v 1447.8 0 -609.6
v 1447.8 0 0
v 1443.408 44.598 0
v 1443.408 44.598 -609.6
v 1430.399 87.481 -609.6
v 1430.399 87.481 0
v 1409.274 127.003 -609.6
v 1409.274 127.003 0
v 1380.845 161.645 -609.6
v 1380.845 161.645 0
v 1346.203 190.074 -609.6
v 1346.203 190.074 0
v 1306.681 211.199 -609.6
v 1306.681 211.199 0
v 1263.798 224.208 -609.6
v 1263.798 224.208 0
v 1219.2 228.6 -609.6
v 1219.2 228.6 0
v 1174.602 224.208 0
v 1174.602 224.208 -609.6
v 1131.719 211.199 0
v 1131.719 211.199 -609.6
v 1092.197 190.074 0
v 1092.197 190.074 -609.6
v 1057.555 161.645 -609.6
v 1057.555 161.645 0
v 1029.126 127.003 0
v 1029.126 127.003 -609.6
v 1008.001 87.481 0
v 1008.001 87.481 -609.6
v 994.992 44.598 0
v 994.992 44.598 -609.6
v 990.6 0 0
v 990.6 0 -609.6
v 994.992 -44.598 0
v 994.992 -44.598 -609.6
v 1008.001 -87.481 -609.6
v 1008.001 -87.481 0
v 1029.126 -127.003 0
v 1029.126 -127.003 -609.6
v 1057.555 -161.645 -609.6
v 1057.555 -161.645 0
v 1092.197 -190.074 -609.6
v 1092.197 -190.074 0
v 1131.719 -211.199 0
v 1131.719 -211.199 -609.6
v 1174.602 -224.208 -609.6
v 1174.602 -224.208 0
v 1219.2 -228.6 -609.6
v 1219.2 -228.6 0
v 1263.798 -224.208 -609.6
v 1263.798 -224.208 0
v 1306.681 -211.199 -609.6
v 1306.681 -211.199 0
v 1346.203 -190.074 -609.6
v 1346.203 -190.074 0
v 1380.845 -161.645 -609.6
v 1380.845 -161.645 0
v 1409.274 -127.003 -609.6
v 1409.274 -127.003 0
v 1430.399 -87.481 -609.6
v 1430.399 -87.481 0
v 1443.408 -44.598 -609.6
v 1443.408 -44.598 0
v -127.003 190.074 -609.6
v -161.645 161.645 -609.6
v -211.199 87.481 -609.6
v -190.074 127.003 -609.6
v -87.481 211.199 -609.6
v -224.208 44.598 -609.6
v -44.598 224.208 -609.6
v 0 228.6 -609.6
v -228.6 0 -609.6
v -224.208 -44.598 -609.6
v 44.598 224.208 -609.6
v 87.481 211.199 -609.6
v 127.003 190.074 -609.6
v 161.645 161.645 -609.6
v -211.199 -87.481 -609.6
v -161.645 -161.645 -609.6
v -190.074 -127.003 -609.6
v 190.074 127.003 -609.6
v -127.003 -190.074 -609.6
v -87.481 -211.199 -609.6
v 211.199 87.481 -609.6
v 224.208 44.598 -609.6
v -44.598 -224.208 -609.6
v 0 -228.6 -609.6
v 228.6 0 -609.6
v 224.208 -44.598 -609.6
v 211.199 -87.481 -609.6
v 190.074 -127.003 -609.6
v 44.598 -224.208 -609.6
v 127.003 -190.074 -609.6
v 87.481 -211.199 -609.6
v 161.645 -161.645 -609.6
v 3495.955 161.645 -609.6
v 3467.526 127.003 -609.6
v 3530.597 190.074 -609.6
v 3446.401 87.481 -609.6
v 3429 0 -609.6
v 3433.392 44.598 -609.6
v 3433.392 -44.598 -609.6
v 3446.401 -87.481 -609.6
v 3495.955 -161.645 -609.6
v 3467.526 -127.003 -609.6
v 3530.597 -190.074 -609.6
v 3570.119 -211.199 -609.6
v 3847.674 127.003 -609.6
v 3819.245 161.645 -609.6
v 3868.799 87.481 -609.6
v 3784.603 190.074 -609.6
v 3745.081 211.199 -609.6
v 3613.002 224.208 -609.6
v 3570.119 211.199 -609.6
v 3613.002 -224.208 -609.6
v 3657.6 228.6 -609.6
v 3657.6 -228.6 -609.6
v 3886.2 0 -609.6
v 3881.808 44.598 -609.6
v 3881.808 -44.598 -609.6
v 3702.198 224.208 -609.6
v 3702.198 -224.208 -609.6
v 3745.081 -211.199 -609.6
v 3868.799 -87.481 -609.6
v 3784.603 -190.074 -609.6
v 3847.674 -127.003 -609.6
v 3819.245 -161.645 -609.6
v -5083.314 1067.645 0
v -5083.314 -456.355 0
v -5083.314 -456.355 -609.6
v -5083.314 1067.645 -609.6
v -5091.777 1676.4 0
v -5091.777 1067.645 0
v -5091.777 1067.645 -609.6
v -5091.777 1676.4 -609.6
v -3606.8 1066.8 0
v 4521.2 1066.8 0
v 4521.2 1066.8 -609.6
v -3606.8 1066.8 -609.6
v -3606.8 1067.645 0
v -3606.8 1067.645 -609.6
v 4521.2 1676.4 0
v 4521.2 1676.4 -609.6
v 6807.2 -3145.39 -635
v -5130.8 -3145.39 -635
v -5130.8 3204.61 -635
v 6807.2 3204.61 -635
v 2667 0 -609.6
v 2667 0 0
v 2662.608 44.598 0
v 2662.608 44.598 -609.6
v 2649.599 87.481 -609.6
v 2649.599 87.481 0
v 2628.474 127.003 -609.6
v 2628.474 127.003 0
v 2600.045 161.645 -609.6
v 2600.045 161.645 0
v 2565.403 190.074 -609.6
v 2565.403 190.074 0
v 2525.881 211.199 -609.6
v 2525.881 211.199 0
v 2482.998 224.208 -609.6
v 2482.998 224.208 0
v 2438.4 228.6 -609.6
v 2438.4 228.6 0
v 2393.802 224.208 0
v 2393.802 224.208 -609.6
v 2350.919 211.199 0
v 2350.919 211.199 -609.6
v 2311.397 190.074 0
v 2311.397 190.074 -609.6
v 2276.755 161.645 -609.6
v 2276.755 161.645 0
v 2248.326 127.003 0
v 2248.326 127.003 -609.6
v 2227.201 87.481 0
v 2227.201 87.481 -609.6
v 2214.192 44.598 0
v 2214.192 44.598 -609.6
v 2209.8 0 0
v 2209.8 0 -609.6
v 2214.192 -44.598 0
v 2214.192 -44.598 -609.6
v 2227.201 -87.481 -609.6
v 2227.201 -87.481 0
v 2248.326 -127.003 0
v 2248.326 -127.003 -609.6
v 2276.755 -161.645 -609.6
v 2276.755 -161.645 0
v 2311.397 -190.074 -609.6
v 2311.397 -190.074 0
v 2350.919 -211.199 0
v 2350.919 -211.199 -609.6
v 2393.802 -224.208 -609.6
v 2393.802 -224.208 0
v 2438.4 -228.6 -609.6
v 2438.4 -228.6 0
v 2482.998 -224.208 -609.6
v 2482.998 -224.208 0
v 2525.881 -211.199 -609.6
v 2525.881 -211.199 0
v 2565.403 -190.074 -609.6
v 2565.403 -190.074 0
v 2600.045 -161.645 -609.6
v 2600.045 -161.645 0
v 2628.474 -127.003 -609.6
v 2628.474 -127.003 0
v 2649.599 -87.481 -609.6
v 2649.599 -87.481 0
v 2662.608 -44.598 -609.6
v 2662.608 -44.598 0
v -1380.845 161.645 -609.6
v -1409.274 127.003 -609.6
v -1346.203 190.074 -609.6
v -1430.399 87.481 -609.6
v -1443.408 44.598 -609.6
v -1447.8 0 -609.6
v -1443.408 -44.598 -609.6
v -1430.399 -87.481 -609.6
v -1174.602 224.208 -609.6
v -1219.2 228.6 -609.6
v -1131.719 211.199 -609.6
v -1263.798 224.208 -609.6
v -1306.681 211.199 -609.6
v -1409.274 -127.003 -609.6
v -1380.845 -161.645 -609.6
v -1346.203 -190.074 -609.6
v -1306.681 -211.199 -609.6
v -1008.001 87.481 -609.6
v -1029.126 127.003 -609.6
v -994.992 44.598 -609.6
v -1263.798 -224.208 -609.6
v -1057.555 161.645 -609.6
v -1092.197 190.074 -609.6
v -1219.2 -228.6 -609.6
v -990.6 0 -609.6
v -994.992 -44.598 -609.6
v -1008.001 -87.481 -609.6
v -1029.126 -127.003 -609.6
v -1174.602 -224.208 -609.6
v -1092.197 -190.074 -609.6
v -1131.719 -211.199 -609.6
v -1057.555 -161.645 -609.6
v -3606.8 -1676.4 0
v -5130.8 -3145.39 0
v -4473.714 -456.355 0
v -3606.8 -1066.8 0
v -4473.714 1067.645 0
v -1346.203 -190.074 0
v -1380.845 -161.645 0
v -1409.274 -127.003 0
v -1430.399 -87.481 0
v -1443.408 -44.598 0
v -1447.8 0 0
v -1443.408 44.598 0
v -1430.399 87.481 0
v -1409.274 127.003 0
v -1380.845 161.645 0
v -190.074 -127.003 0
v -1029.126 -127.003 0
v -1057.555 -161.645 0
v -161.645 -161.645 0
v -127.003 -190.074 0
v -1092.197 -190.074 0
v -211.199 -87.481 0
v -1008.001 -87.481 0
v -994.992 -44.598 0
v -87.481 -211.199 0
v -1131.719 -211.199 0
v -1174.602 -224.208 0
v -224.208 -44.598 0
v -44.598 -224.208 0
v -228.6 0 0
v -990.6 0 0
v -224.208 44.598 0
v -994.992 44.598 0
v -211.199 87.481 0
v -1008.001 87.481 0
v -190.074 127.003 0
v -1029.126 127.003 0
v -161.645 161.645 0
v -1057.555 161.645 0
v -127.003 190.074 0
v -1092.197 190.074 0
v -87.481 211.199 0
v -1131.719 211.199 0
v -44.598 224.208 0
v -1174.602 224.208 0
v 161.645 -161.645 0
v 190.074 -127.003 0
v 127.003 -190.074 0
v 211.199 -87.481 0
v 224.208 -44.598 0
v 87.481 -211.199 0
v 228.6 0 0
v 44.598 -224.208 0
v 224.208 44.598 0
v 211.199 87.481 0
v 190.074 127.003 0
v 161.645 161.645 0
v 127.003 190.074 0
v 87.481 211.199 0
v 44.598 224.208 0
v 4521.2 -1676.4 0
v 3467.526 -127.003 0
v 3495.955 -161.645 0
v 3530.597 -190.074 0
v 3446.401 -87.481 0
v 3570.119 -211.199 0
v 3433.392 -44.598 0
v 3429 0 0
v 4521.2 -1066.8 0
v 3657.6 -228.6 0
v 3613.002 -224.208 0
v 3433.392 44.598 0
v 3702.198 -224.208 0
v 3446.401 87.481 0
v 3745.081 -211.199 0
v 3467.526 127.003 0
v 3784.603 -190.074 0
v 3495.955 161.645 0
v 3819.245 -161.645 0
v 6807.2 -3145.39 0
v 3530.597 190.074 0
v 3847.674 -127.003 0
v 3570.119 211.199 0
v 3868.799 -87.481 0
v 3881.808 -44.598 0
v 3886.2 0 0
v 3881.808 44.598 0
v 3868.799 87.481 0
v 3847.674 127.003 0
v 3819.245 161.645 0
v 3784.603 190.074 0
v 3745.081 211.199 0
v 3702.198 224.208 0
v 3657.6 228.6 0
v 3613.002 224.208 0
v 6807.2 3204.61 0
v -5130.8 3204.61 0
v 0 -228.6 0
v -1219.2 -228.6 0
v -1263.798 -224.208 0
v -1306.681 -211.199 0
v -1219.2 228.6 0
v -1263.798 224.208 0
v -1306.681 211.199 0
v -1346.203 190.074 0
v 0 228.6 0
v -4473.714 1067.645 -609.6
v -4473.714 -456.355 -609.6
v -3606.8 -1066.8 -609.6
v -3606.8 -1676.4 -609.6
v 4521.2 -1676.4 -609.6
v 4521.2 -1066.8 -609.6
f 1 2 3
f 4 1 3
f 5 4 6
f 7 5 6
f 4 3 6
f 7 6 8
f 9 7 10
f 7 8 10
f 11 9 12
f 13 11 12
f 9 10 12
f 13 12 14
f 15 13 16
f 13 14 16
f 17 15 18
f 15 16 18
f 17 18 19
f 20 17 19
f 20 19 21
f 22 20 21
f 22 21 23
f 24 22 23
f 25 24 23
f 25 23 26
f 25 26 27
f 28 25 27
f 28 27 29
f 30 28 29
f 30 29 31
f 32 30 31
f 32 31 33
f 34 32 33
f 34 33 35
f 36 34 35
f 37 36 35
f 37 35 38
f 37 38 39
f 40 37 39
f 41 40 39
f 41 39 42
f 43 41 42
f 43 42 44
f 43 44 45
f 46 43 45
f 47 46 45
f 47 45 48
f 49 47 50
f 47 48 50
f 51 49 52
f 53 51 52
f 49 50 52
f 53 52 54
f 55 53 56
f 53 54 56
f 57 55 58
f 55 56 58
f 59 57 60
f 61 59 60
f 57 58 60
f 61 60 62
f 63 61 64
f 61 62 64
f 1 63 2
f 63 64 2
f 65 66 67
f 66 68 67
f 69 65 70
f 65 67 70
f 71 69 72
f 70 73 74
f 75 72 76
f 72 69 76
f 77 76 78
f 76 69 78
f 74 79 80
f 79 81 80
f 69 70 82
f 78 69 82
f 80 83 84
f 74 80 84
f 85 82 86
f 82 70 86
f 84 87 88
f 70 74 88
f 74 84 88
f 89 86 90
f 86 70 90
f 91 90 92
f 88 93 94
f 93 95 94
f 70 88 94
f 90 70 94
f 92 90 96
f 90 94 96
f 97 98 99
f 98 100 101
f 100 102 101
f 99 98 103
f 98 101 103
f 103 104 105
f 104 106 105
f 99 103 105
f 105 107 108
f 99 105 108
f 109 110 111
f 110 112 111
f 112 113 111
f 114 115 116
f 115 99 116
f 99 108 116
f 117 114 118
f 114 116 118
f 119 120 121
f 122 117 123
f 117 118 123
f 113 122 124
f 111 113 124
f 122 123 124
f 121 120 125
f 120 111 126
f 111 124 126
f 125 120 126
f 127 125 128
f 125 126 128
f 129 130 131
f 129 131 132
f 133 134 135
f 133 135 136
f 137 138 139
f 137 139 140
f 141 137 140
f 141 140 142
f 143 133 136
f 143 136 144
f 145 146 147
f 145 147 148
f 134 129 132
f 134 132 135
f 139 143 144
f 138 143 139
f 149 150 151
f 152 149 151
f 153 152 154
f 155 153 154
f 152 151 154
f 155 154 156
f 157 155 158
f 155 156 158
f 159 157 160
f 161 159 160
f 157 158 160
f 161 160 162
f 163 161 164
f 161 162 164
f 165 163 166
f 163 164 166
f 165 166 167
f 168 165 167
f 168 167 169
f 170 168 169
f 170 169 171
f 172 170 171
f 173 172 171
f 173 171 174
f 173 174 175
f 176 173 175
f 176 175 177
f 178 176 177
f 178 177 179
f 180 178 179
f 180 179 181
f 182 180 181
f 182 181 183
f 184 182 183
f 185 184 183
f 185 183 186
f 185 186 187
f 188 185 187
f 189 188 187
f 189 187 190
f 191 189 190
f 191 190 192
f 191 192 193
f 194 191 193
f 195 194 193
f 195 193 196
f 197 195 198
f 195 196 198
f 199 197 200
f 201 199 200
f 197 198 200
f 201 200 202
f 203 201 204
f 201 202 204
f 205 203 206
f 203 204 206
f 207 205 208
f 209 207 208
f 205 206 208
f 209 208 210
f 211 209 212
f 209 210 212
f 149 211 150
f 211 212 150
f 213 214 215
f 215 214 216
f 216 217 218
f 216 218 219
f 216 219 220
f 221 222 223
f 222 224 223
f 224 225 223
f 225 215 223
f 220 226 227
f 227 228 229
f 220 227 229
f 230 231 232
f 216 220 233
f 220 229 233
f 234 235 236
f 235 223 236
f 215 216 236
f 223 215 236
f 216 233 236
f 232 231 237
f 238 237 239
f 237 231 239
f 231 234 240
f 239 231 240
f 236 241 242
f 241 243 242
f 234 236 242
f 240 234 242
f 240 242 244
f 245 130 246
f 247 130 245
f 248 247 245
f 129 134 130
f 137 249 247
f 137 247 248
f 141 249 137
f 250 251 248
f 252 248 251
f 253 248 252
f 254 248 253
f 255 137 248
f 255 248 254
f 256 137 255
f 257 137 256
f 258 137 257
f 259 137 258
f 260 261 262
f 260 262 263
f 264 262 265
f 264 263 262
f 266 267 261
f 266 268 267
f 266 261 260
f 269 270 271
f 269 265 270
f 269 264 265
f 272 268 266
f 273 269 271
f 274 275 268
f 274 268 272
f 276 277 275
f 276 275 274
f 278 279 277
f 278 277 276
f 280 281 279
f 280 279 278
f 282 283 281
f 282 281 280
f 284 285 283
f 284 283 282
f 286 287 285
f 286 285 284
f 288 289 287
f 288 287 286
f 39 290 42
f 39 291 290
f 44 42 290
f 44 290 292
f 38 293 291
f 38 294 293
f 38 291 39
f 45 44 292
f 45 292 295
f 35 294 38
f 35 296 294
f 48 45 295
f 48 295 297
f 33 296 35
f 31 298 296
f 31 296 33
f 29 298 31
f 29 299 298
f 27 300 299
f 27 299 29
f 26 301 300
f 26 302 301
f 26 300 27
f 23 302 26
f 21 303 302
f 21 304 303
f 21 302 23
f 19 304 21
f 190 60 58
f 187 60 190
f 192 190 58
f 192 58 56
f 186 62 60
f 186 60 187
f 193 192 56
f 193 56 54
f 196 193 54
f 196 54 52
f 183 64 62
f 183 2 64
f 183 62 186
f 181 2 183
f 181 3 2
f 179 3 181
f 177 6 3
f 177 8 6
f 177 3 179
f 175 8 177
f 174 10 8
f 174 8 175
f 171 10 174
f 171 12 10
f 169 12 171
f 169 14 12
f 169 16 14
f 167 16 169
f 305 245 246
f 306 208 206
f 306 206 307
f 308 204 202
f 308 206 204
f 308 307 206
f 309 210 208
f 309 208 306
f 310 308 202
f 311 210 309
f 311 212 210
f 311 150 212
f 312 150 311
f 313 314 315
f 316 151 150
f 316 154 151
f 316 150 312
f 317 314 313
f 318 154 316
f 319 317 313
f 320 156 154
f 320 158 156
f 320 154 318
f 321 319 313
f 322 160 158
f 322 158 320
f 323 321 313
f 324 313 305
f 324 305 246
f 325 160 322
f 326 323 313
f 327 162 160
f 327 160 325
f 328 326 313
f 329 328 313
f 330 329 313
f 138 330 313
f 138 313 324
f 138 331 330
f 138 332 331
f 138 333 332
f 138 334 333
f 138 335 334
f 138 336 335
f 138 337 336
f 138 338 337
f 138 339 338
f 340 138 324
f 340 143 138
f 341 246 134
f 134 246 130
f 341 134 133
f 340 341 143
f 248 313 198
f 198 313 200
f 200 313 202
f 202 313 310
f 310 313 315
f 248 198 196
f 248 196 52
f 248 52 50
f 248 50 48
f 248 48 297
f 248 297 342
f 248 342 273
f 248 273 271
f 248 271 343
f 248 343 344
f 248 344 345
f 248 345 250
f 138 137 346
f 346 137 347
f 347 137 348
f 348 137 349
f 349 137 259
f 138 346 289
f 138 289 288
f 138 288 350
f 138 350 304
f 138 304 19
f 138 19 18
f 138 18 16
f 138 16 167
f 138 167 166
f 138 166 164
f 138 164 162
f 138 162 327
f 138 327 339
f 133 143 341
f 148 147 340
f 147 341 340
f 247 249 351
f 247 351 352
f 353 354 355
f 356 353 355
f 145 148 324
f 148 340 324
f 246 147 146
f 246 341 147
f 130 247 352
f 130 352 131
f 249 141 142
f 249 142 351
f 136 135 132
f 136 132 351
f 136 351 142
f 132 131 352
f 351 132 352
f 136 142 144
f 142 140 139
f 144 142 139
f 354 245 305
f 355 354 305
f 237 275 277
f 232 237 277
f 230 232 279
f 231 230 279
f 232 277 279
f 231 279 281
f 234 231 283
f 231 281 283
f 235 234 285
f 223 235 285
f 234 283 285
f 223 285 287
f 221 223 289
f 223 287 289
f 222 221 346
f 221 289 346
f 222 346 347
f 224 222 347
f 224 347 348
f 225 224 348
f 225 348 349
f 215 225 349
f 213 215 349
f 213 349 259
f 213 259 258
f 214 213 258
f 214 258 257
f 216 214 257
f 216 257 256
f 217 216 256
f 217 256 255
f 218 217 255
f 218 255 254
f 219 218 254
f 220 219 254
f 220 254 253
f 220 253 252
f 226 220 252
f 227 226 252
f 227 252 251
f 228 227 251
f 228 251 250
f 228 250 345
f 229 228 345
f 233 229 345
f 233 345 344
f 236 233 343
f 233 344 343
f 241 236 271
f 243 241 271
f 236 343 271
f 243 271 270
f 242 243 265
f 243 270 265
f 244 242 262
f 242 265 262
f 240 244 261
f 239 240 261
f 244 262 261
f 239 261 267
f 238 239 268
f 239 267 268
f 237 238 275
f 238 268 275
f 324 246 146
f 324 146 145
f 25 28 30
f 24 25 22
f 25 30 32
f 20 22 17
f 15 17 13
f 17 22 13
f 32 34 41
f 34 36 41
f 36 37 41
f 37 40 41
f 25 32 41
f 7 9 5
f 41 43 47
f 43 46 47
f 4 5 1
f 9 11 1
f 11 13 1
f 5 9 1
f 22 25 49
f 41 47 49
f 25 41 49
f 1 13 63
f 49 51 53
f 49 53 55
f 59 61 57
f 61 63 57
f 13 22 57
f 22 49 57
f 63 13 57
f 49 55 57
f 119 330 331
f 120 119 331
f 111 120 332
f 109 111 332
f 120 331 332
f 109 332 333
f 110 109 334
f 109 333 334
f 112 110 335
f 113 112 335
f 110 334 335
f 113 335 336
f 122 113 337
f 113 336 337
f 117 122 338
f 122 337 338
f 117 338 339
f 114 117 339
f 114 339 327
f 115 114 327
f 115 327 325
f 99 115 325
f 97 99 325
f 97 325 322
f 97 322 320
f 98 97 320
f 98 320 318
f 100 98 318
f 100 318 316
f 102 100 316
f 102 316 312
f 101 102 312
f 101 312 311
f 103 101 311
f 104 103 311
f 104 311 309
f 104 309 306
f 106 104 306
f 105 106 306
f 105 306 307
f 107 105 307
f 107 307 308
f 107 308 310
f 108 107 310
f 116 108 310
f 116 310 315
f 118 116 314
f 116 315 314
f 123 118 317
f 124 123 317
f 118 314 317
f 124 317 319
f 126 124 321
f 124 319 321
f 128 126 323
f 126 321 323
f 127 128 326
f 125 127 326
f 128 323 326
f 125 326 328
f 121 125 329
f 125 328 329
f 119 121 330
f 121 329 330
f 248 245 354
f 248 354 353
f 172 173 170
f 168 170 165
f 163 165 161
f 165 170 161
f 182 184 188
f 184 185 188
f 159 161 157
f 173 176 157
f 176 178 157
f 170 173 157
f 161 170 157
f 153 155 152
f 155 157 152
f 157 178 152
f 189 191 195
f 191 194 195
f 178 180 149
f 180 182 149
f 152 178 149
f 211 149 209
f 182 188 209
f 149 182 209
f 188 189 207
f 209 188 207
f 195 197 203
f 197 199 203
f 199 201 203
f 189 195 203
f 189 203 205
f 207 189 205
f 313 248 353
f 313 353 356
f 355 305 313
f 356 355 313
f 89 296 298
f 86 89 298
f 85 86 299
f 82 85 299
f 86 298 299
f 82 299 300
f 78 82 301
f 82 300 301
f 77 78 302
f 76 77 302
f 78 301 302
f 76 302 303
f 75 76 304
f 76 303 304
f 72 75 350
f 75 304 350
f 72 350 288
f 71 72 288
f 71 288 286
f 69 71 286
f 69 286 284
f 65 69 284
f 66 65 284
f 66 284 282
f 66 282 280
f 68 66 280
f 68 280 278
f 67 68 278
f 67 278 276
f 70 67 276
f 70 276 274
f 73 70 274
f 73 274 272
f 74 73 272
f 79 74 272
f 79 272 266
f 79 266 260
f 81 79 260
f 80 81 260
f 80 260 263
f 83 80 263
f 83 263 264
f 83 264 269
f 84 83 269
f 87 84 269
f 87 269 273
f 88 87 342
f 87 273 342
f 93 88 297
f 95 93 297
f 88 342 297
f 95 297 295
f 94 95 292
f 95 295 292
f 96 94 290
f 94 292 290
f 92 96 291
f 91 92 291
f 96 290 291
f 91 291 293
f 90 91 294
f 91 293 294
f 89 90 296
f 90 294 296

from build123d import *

# Parameters (mm, degrees)
F0_W     = 11938
F0_H     = 6350
F0_W_2   = 8128
F0_H_2   = 609.6
F1_DEPTH = 609.6
F2_R     = 228.6
F3_DEPTH = 609.601
F4_W     = 11938
F4_H     = 6350
F5_DEPTH = 25.4


with BuildPart() as f1:
    # F0 (on Top) → F1 (new body)
    with BuildSketch(Plane.XY):
        with Locations((838.2, 29.609966)):
            Rectangle(F0_W, F0_H)
        with Locations((457.2, -1371.6)):
            Rectangle(F0_W_2, F0_H_2, mode=Mode.SUBTRACT)
        Polygon((4521.2, 1066.8), (-3606.8, 1066.8), (-3606.8, 1067.644954), (-4473.713942, 1067.644954), (-4473.713942, -456.355046), (-5083.313942, -456.355046), (-5083.313942, 1067.644954), (-5091.777325, 1067.644954), (-5091.777325, 1676.4), (-3606.8, 1676.4), (4521.2, 1676.4), align=None, mode=Mode.SUBTRACT)
    extrude(amount=-F1_DEPTH)

    # F2 (on face) → F3 (cut, through all)
    with BuildSketch(Plane.XY):
        Circle(F2_R)
        with Locations((-1219.2, 0)):
            Circle(F2_R)
        with Locations((1219.2, 0)):
            Circle(F2_R)
        with Locations((2438.4, 0)):
            Circle(F2_R)
        with Locations((3657.6, 0)):
            Circle(F2_R)
    extrude(amount=-F3_DEPTH, mode=Mode.SUBTRACT)

    # F4 (on face) → F5 (join)
    with BuildSketch(Plane(origin=(0, 0, -609.6), x_dir=(1, 0, 0), z_dir=(0, 0, -1))):
        with Locations((838.2, -29.609966)):
            Rectangle(F4_W, F4_H)
    extrude(amount=F5_DEPTH)


solid = f1.part
